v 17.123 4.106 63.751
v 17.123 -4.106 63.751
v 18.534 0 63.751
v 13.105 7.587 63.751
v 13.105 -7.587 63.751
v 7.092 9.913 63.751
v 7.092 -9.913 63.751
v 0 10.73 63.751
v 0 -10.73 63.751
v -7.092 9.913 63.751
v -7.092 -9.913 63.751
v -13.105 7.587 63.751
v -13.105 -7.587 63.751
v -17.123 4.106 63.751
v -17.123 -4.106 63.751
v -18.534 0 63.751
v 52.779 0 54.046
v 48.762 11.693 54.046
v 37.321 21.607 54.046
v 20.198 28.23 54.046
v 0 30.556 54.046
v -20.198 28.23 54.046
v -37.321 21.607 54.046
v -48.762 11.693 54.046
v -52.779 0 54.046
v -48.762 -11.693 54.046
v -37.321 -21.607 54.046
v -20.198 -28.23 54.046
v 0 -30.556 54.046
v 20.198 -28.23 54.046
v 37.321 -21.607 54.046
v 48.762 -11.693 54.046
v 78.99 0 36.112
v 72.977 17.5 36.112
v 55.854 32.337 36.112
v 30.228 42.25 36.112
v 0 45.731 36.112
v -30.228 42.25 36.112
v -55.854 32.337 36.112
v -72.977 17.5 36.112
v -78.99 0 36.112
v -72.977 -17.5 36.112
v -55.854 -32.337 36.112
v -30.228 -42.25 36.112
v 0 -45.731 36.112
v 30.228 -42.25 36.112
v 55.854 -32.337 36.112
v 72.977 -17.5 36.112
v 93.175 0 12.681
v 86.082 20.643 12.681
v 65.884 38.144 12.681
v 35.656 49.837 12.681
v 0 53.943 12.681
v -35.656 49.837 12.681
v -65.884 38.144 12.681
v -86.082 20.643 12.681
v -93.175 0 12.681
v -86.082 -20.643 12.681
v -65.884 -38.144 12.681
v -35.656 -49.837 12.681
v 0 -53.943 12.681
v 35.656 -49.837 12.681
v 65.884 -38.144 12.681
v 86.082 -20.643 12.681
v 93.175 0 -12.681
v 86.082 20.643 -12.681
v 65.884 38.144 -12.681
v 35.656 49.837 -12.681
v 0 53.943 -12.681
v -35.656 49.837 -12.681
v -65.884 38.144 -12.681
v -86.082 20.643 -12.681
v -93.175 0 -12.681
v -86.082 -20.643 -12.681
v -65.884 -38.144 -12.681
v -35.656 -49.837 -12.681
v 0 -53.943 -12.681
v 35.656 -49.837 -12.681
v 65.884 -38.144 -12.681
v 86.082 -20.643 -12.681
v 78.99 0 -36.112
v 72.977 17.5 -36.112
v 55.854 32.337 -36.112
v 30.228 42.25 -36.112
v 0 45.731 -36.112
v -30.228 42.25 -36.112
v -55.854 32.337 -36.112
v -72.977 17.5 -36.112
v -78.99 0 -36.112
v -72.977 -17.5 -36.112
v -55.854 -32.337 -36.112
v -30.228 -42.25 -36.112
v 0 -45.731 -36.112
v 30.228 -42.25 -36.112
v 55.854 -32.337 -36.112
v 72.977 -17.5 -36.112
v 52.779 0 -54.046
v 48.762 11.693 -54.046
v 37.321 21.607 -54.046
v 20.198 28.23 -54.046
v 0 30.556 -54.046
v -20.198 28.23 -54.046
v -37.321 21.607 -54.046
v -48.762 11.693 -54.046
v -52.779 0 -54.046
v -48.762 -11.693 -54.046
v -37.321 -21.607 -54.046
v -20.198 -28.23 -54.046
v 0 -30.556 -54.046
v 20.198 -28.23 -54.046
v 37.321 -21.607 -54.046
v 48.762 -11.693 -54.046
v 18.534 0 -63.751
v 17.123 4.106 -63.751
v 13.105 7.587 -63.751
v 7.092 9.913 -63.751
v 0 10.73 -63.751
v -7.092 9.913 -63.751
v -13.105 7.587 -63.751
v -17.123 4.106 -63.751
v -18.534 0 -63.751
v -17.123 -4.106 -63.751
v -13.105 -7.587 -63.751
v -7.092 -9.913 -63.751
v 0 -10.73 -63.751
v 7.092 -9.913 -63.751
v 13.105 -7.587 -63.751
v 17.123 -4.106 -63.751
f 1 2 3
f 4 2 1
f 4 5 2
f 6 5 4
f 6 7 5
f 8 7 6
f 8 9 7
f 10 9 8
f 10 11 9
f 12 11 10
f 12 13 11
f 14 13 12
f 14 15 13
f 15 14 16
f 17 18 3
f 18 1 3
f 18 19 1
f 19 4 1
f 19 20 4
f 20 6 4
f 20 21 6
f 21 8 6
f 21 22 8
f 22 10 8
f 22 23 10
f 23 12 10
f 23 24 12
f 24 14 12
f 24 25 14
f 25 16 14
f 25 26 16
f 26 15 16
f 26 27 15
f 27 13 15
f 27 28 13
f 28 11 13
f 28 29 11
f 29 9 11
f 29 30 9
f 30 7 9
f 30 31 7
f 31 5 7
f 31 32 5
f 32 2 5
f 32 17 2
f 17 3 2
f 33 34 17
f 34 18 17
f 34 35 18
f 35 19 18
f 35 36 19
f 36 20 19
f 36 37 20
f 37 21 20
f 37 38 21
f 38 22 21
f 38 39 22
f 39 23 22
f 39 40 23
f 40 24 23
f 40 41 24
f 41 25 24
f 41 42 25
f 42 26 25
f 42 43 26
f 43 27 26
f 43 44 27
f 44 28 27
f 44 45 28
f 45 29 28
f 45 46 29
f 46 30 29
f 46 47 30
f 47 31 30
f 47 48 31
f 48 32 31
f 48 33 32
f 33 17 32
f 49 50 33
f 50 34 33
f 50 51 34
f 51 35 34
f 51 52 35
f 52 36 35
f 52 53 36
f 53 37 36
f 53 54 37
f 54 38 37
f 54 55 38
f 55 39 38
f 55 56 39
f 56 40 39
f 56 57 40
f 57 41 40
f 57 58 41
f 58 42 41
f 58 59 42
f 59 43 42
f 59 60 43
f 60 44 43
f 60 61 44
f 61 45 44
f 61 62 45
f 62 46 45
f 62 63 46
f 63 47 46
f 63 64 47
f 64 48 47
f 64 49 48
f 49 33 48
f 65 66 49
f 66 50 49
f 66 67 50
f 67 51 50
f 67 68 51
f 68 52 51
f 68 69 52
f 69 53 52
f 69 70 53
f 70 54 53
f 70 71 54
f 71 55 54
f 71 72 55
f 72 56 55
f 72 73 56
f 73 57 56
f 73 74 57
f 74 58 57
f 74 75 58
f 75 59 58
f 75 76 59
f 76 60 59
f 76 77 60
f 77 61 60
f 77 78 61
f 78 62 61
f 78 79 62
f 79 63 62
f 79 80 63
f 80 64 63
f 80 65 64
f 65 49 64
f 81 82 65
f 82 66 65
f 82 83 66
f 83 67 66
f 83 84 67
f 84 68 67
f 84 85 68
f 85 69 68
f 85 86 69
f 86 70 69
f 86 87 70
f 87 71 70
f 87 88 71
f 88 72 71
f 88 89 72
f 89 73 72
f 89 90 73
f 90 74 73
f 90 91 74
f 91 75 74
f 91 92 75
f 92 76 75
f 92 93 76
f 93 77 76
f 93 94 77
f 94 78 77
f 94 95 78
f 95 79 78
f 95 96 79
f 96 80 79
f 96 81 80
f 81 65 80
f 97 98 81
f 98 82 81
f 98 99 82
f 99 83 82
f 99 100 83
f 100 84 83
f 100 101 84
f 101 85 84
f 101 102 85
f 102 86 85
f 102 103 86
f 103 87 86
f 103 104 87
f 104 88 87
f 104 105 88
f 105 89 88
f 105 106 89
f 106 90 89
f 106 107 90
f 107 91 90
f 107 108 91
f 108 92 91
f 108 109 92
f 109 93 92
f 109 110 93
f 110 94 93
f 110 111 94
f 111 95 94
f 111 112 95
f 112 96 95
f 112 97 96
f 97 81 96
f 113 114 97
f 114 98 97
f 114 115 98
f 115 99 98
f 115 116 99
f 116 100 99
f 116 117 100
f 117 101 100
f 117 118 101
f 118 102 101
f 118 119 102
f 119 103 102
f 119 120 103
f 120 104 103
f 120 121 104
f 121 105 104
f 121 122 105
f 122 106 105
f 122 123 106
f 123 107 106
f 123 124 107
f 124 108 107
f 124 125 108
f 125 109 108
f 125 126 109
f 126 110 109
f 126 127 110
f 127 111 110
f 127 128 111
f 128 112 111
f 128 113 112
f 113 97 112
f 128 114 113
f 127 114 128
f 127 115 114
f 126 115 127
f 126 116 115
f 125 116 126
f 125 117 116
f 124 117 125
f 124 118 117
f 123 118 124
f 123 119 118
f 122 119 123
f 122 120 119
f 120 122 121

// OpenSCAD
// Generated by SolidPython 1.0.1 on 2020-07-29 00:46:54


scale(v = [19, 11, 13]) {
	sphere(r = 5);
}
/***********************************************
*********      SolidPython code:      **********
************************************************
 
# import packages: SolidPython
from solid import *
from solid.utils import *
from itertools import chain, combinations, permutations


class Resize:

    def __init__(self, scad_file):
        self.scad_file = scad_file
        #self.scad_file = import_scad(scad_file)
        # cone/cylinder param:
        self.r1 = 0
        self.r2 = 0
        self.h = 0
        # rectangular prism param:
        self.w = 0
        self.l = 0
        # ellipse param:
        self.r = 0

    # import OpenScad code (file name corresponds to shape)


    # classify shape + parameters
    def assign(self, param1, param2, param3):
        if self.scad_file == 'cone.scad':
            self.r1 = param1
            self.r2 = param2
            self.h = param3
        elif self.scad_file == 'cylinder.scad':
            self.r1 = param1
            self.r2 = param2
            self.h = param3
        elif self.scad_file == 'rectangularPrism.scad':
            self.h = param1
            self.l = param2
            self.w = param3
        else:
            self.r = param1
            self.h = param2

    # resize parameters
    def iterate(self):
        x = range(3, 20, 2)
        i = 1
        if self.scad_file == 'cone.scad':
            tempList = list(permutations(x, 2))
            for temp in tempList:
                param1 = temp[0]
                param2 = temp[1]
                filepath = 'produced_scad_files/' + 'cone' + str(param1) + '_' + str(param2) + '_' + '.scad'
                scad_render_to_file(cylinder(h=param1, r1=param2, r2=0), filepath)

        elif self.scad_file == 'cylinder.scad':
            tempList = list(permutations(x, 3))
            for temp in tempList:
                param1 = temp[0]
                param2 = temp[1]
                filepath = 'produced_scad_files/' + 'cylinder' + str(param1) + '_' + str(param2) + '_' + '.scad'
                scad_render_to_file(cylinder(h=param1, r1=param2, r2=param2), filepath)

        elif self.scad_file == 'rectangularPrism.scad':
            tempList = list(permutations(x, 3))
            for temp in tempList:
                param1 = temp[0]
                param2 = temp[1]
                param3 = temp[2]
                filepath = 'produced_scad_files/' + 'rectangularPrism' + str(param1) + '_' + str(param2) + '_' + str(
                    param3) + '.scad'
                scad_render_to_file(cube(size=(param1, param2, param3)), filepath)

        elif self.scad_file == 'ellipse.scad':
            tempList = list(permutations(x, 4))
            for temp in tempList:
                param1 = temp[0]
                param2 = temp[1]
                param3 = temp[2]
                param4 = temp[3]
                filepath = 'produced_scad_files/' + 'ellipse' + str(param1) + '_' + str(param2) + '_' + str(param3) + '_' + str(param4) + '.scad'
                scad_render_to_file(scale([param1, param2, param3])(sphere(r=param4)), filepath)

    def render_to_scadfile(self):
        scad_render_to_file(scad, 'example.scad') 
 
************************************************/
